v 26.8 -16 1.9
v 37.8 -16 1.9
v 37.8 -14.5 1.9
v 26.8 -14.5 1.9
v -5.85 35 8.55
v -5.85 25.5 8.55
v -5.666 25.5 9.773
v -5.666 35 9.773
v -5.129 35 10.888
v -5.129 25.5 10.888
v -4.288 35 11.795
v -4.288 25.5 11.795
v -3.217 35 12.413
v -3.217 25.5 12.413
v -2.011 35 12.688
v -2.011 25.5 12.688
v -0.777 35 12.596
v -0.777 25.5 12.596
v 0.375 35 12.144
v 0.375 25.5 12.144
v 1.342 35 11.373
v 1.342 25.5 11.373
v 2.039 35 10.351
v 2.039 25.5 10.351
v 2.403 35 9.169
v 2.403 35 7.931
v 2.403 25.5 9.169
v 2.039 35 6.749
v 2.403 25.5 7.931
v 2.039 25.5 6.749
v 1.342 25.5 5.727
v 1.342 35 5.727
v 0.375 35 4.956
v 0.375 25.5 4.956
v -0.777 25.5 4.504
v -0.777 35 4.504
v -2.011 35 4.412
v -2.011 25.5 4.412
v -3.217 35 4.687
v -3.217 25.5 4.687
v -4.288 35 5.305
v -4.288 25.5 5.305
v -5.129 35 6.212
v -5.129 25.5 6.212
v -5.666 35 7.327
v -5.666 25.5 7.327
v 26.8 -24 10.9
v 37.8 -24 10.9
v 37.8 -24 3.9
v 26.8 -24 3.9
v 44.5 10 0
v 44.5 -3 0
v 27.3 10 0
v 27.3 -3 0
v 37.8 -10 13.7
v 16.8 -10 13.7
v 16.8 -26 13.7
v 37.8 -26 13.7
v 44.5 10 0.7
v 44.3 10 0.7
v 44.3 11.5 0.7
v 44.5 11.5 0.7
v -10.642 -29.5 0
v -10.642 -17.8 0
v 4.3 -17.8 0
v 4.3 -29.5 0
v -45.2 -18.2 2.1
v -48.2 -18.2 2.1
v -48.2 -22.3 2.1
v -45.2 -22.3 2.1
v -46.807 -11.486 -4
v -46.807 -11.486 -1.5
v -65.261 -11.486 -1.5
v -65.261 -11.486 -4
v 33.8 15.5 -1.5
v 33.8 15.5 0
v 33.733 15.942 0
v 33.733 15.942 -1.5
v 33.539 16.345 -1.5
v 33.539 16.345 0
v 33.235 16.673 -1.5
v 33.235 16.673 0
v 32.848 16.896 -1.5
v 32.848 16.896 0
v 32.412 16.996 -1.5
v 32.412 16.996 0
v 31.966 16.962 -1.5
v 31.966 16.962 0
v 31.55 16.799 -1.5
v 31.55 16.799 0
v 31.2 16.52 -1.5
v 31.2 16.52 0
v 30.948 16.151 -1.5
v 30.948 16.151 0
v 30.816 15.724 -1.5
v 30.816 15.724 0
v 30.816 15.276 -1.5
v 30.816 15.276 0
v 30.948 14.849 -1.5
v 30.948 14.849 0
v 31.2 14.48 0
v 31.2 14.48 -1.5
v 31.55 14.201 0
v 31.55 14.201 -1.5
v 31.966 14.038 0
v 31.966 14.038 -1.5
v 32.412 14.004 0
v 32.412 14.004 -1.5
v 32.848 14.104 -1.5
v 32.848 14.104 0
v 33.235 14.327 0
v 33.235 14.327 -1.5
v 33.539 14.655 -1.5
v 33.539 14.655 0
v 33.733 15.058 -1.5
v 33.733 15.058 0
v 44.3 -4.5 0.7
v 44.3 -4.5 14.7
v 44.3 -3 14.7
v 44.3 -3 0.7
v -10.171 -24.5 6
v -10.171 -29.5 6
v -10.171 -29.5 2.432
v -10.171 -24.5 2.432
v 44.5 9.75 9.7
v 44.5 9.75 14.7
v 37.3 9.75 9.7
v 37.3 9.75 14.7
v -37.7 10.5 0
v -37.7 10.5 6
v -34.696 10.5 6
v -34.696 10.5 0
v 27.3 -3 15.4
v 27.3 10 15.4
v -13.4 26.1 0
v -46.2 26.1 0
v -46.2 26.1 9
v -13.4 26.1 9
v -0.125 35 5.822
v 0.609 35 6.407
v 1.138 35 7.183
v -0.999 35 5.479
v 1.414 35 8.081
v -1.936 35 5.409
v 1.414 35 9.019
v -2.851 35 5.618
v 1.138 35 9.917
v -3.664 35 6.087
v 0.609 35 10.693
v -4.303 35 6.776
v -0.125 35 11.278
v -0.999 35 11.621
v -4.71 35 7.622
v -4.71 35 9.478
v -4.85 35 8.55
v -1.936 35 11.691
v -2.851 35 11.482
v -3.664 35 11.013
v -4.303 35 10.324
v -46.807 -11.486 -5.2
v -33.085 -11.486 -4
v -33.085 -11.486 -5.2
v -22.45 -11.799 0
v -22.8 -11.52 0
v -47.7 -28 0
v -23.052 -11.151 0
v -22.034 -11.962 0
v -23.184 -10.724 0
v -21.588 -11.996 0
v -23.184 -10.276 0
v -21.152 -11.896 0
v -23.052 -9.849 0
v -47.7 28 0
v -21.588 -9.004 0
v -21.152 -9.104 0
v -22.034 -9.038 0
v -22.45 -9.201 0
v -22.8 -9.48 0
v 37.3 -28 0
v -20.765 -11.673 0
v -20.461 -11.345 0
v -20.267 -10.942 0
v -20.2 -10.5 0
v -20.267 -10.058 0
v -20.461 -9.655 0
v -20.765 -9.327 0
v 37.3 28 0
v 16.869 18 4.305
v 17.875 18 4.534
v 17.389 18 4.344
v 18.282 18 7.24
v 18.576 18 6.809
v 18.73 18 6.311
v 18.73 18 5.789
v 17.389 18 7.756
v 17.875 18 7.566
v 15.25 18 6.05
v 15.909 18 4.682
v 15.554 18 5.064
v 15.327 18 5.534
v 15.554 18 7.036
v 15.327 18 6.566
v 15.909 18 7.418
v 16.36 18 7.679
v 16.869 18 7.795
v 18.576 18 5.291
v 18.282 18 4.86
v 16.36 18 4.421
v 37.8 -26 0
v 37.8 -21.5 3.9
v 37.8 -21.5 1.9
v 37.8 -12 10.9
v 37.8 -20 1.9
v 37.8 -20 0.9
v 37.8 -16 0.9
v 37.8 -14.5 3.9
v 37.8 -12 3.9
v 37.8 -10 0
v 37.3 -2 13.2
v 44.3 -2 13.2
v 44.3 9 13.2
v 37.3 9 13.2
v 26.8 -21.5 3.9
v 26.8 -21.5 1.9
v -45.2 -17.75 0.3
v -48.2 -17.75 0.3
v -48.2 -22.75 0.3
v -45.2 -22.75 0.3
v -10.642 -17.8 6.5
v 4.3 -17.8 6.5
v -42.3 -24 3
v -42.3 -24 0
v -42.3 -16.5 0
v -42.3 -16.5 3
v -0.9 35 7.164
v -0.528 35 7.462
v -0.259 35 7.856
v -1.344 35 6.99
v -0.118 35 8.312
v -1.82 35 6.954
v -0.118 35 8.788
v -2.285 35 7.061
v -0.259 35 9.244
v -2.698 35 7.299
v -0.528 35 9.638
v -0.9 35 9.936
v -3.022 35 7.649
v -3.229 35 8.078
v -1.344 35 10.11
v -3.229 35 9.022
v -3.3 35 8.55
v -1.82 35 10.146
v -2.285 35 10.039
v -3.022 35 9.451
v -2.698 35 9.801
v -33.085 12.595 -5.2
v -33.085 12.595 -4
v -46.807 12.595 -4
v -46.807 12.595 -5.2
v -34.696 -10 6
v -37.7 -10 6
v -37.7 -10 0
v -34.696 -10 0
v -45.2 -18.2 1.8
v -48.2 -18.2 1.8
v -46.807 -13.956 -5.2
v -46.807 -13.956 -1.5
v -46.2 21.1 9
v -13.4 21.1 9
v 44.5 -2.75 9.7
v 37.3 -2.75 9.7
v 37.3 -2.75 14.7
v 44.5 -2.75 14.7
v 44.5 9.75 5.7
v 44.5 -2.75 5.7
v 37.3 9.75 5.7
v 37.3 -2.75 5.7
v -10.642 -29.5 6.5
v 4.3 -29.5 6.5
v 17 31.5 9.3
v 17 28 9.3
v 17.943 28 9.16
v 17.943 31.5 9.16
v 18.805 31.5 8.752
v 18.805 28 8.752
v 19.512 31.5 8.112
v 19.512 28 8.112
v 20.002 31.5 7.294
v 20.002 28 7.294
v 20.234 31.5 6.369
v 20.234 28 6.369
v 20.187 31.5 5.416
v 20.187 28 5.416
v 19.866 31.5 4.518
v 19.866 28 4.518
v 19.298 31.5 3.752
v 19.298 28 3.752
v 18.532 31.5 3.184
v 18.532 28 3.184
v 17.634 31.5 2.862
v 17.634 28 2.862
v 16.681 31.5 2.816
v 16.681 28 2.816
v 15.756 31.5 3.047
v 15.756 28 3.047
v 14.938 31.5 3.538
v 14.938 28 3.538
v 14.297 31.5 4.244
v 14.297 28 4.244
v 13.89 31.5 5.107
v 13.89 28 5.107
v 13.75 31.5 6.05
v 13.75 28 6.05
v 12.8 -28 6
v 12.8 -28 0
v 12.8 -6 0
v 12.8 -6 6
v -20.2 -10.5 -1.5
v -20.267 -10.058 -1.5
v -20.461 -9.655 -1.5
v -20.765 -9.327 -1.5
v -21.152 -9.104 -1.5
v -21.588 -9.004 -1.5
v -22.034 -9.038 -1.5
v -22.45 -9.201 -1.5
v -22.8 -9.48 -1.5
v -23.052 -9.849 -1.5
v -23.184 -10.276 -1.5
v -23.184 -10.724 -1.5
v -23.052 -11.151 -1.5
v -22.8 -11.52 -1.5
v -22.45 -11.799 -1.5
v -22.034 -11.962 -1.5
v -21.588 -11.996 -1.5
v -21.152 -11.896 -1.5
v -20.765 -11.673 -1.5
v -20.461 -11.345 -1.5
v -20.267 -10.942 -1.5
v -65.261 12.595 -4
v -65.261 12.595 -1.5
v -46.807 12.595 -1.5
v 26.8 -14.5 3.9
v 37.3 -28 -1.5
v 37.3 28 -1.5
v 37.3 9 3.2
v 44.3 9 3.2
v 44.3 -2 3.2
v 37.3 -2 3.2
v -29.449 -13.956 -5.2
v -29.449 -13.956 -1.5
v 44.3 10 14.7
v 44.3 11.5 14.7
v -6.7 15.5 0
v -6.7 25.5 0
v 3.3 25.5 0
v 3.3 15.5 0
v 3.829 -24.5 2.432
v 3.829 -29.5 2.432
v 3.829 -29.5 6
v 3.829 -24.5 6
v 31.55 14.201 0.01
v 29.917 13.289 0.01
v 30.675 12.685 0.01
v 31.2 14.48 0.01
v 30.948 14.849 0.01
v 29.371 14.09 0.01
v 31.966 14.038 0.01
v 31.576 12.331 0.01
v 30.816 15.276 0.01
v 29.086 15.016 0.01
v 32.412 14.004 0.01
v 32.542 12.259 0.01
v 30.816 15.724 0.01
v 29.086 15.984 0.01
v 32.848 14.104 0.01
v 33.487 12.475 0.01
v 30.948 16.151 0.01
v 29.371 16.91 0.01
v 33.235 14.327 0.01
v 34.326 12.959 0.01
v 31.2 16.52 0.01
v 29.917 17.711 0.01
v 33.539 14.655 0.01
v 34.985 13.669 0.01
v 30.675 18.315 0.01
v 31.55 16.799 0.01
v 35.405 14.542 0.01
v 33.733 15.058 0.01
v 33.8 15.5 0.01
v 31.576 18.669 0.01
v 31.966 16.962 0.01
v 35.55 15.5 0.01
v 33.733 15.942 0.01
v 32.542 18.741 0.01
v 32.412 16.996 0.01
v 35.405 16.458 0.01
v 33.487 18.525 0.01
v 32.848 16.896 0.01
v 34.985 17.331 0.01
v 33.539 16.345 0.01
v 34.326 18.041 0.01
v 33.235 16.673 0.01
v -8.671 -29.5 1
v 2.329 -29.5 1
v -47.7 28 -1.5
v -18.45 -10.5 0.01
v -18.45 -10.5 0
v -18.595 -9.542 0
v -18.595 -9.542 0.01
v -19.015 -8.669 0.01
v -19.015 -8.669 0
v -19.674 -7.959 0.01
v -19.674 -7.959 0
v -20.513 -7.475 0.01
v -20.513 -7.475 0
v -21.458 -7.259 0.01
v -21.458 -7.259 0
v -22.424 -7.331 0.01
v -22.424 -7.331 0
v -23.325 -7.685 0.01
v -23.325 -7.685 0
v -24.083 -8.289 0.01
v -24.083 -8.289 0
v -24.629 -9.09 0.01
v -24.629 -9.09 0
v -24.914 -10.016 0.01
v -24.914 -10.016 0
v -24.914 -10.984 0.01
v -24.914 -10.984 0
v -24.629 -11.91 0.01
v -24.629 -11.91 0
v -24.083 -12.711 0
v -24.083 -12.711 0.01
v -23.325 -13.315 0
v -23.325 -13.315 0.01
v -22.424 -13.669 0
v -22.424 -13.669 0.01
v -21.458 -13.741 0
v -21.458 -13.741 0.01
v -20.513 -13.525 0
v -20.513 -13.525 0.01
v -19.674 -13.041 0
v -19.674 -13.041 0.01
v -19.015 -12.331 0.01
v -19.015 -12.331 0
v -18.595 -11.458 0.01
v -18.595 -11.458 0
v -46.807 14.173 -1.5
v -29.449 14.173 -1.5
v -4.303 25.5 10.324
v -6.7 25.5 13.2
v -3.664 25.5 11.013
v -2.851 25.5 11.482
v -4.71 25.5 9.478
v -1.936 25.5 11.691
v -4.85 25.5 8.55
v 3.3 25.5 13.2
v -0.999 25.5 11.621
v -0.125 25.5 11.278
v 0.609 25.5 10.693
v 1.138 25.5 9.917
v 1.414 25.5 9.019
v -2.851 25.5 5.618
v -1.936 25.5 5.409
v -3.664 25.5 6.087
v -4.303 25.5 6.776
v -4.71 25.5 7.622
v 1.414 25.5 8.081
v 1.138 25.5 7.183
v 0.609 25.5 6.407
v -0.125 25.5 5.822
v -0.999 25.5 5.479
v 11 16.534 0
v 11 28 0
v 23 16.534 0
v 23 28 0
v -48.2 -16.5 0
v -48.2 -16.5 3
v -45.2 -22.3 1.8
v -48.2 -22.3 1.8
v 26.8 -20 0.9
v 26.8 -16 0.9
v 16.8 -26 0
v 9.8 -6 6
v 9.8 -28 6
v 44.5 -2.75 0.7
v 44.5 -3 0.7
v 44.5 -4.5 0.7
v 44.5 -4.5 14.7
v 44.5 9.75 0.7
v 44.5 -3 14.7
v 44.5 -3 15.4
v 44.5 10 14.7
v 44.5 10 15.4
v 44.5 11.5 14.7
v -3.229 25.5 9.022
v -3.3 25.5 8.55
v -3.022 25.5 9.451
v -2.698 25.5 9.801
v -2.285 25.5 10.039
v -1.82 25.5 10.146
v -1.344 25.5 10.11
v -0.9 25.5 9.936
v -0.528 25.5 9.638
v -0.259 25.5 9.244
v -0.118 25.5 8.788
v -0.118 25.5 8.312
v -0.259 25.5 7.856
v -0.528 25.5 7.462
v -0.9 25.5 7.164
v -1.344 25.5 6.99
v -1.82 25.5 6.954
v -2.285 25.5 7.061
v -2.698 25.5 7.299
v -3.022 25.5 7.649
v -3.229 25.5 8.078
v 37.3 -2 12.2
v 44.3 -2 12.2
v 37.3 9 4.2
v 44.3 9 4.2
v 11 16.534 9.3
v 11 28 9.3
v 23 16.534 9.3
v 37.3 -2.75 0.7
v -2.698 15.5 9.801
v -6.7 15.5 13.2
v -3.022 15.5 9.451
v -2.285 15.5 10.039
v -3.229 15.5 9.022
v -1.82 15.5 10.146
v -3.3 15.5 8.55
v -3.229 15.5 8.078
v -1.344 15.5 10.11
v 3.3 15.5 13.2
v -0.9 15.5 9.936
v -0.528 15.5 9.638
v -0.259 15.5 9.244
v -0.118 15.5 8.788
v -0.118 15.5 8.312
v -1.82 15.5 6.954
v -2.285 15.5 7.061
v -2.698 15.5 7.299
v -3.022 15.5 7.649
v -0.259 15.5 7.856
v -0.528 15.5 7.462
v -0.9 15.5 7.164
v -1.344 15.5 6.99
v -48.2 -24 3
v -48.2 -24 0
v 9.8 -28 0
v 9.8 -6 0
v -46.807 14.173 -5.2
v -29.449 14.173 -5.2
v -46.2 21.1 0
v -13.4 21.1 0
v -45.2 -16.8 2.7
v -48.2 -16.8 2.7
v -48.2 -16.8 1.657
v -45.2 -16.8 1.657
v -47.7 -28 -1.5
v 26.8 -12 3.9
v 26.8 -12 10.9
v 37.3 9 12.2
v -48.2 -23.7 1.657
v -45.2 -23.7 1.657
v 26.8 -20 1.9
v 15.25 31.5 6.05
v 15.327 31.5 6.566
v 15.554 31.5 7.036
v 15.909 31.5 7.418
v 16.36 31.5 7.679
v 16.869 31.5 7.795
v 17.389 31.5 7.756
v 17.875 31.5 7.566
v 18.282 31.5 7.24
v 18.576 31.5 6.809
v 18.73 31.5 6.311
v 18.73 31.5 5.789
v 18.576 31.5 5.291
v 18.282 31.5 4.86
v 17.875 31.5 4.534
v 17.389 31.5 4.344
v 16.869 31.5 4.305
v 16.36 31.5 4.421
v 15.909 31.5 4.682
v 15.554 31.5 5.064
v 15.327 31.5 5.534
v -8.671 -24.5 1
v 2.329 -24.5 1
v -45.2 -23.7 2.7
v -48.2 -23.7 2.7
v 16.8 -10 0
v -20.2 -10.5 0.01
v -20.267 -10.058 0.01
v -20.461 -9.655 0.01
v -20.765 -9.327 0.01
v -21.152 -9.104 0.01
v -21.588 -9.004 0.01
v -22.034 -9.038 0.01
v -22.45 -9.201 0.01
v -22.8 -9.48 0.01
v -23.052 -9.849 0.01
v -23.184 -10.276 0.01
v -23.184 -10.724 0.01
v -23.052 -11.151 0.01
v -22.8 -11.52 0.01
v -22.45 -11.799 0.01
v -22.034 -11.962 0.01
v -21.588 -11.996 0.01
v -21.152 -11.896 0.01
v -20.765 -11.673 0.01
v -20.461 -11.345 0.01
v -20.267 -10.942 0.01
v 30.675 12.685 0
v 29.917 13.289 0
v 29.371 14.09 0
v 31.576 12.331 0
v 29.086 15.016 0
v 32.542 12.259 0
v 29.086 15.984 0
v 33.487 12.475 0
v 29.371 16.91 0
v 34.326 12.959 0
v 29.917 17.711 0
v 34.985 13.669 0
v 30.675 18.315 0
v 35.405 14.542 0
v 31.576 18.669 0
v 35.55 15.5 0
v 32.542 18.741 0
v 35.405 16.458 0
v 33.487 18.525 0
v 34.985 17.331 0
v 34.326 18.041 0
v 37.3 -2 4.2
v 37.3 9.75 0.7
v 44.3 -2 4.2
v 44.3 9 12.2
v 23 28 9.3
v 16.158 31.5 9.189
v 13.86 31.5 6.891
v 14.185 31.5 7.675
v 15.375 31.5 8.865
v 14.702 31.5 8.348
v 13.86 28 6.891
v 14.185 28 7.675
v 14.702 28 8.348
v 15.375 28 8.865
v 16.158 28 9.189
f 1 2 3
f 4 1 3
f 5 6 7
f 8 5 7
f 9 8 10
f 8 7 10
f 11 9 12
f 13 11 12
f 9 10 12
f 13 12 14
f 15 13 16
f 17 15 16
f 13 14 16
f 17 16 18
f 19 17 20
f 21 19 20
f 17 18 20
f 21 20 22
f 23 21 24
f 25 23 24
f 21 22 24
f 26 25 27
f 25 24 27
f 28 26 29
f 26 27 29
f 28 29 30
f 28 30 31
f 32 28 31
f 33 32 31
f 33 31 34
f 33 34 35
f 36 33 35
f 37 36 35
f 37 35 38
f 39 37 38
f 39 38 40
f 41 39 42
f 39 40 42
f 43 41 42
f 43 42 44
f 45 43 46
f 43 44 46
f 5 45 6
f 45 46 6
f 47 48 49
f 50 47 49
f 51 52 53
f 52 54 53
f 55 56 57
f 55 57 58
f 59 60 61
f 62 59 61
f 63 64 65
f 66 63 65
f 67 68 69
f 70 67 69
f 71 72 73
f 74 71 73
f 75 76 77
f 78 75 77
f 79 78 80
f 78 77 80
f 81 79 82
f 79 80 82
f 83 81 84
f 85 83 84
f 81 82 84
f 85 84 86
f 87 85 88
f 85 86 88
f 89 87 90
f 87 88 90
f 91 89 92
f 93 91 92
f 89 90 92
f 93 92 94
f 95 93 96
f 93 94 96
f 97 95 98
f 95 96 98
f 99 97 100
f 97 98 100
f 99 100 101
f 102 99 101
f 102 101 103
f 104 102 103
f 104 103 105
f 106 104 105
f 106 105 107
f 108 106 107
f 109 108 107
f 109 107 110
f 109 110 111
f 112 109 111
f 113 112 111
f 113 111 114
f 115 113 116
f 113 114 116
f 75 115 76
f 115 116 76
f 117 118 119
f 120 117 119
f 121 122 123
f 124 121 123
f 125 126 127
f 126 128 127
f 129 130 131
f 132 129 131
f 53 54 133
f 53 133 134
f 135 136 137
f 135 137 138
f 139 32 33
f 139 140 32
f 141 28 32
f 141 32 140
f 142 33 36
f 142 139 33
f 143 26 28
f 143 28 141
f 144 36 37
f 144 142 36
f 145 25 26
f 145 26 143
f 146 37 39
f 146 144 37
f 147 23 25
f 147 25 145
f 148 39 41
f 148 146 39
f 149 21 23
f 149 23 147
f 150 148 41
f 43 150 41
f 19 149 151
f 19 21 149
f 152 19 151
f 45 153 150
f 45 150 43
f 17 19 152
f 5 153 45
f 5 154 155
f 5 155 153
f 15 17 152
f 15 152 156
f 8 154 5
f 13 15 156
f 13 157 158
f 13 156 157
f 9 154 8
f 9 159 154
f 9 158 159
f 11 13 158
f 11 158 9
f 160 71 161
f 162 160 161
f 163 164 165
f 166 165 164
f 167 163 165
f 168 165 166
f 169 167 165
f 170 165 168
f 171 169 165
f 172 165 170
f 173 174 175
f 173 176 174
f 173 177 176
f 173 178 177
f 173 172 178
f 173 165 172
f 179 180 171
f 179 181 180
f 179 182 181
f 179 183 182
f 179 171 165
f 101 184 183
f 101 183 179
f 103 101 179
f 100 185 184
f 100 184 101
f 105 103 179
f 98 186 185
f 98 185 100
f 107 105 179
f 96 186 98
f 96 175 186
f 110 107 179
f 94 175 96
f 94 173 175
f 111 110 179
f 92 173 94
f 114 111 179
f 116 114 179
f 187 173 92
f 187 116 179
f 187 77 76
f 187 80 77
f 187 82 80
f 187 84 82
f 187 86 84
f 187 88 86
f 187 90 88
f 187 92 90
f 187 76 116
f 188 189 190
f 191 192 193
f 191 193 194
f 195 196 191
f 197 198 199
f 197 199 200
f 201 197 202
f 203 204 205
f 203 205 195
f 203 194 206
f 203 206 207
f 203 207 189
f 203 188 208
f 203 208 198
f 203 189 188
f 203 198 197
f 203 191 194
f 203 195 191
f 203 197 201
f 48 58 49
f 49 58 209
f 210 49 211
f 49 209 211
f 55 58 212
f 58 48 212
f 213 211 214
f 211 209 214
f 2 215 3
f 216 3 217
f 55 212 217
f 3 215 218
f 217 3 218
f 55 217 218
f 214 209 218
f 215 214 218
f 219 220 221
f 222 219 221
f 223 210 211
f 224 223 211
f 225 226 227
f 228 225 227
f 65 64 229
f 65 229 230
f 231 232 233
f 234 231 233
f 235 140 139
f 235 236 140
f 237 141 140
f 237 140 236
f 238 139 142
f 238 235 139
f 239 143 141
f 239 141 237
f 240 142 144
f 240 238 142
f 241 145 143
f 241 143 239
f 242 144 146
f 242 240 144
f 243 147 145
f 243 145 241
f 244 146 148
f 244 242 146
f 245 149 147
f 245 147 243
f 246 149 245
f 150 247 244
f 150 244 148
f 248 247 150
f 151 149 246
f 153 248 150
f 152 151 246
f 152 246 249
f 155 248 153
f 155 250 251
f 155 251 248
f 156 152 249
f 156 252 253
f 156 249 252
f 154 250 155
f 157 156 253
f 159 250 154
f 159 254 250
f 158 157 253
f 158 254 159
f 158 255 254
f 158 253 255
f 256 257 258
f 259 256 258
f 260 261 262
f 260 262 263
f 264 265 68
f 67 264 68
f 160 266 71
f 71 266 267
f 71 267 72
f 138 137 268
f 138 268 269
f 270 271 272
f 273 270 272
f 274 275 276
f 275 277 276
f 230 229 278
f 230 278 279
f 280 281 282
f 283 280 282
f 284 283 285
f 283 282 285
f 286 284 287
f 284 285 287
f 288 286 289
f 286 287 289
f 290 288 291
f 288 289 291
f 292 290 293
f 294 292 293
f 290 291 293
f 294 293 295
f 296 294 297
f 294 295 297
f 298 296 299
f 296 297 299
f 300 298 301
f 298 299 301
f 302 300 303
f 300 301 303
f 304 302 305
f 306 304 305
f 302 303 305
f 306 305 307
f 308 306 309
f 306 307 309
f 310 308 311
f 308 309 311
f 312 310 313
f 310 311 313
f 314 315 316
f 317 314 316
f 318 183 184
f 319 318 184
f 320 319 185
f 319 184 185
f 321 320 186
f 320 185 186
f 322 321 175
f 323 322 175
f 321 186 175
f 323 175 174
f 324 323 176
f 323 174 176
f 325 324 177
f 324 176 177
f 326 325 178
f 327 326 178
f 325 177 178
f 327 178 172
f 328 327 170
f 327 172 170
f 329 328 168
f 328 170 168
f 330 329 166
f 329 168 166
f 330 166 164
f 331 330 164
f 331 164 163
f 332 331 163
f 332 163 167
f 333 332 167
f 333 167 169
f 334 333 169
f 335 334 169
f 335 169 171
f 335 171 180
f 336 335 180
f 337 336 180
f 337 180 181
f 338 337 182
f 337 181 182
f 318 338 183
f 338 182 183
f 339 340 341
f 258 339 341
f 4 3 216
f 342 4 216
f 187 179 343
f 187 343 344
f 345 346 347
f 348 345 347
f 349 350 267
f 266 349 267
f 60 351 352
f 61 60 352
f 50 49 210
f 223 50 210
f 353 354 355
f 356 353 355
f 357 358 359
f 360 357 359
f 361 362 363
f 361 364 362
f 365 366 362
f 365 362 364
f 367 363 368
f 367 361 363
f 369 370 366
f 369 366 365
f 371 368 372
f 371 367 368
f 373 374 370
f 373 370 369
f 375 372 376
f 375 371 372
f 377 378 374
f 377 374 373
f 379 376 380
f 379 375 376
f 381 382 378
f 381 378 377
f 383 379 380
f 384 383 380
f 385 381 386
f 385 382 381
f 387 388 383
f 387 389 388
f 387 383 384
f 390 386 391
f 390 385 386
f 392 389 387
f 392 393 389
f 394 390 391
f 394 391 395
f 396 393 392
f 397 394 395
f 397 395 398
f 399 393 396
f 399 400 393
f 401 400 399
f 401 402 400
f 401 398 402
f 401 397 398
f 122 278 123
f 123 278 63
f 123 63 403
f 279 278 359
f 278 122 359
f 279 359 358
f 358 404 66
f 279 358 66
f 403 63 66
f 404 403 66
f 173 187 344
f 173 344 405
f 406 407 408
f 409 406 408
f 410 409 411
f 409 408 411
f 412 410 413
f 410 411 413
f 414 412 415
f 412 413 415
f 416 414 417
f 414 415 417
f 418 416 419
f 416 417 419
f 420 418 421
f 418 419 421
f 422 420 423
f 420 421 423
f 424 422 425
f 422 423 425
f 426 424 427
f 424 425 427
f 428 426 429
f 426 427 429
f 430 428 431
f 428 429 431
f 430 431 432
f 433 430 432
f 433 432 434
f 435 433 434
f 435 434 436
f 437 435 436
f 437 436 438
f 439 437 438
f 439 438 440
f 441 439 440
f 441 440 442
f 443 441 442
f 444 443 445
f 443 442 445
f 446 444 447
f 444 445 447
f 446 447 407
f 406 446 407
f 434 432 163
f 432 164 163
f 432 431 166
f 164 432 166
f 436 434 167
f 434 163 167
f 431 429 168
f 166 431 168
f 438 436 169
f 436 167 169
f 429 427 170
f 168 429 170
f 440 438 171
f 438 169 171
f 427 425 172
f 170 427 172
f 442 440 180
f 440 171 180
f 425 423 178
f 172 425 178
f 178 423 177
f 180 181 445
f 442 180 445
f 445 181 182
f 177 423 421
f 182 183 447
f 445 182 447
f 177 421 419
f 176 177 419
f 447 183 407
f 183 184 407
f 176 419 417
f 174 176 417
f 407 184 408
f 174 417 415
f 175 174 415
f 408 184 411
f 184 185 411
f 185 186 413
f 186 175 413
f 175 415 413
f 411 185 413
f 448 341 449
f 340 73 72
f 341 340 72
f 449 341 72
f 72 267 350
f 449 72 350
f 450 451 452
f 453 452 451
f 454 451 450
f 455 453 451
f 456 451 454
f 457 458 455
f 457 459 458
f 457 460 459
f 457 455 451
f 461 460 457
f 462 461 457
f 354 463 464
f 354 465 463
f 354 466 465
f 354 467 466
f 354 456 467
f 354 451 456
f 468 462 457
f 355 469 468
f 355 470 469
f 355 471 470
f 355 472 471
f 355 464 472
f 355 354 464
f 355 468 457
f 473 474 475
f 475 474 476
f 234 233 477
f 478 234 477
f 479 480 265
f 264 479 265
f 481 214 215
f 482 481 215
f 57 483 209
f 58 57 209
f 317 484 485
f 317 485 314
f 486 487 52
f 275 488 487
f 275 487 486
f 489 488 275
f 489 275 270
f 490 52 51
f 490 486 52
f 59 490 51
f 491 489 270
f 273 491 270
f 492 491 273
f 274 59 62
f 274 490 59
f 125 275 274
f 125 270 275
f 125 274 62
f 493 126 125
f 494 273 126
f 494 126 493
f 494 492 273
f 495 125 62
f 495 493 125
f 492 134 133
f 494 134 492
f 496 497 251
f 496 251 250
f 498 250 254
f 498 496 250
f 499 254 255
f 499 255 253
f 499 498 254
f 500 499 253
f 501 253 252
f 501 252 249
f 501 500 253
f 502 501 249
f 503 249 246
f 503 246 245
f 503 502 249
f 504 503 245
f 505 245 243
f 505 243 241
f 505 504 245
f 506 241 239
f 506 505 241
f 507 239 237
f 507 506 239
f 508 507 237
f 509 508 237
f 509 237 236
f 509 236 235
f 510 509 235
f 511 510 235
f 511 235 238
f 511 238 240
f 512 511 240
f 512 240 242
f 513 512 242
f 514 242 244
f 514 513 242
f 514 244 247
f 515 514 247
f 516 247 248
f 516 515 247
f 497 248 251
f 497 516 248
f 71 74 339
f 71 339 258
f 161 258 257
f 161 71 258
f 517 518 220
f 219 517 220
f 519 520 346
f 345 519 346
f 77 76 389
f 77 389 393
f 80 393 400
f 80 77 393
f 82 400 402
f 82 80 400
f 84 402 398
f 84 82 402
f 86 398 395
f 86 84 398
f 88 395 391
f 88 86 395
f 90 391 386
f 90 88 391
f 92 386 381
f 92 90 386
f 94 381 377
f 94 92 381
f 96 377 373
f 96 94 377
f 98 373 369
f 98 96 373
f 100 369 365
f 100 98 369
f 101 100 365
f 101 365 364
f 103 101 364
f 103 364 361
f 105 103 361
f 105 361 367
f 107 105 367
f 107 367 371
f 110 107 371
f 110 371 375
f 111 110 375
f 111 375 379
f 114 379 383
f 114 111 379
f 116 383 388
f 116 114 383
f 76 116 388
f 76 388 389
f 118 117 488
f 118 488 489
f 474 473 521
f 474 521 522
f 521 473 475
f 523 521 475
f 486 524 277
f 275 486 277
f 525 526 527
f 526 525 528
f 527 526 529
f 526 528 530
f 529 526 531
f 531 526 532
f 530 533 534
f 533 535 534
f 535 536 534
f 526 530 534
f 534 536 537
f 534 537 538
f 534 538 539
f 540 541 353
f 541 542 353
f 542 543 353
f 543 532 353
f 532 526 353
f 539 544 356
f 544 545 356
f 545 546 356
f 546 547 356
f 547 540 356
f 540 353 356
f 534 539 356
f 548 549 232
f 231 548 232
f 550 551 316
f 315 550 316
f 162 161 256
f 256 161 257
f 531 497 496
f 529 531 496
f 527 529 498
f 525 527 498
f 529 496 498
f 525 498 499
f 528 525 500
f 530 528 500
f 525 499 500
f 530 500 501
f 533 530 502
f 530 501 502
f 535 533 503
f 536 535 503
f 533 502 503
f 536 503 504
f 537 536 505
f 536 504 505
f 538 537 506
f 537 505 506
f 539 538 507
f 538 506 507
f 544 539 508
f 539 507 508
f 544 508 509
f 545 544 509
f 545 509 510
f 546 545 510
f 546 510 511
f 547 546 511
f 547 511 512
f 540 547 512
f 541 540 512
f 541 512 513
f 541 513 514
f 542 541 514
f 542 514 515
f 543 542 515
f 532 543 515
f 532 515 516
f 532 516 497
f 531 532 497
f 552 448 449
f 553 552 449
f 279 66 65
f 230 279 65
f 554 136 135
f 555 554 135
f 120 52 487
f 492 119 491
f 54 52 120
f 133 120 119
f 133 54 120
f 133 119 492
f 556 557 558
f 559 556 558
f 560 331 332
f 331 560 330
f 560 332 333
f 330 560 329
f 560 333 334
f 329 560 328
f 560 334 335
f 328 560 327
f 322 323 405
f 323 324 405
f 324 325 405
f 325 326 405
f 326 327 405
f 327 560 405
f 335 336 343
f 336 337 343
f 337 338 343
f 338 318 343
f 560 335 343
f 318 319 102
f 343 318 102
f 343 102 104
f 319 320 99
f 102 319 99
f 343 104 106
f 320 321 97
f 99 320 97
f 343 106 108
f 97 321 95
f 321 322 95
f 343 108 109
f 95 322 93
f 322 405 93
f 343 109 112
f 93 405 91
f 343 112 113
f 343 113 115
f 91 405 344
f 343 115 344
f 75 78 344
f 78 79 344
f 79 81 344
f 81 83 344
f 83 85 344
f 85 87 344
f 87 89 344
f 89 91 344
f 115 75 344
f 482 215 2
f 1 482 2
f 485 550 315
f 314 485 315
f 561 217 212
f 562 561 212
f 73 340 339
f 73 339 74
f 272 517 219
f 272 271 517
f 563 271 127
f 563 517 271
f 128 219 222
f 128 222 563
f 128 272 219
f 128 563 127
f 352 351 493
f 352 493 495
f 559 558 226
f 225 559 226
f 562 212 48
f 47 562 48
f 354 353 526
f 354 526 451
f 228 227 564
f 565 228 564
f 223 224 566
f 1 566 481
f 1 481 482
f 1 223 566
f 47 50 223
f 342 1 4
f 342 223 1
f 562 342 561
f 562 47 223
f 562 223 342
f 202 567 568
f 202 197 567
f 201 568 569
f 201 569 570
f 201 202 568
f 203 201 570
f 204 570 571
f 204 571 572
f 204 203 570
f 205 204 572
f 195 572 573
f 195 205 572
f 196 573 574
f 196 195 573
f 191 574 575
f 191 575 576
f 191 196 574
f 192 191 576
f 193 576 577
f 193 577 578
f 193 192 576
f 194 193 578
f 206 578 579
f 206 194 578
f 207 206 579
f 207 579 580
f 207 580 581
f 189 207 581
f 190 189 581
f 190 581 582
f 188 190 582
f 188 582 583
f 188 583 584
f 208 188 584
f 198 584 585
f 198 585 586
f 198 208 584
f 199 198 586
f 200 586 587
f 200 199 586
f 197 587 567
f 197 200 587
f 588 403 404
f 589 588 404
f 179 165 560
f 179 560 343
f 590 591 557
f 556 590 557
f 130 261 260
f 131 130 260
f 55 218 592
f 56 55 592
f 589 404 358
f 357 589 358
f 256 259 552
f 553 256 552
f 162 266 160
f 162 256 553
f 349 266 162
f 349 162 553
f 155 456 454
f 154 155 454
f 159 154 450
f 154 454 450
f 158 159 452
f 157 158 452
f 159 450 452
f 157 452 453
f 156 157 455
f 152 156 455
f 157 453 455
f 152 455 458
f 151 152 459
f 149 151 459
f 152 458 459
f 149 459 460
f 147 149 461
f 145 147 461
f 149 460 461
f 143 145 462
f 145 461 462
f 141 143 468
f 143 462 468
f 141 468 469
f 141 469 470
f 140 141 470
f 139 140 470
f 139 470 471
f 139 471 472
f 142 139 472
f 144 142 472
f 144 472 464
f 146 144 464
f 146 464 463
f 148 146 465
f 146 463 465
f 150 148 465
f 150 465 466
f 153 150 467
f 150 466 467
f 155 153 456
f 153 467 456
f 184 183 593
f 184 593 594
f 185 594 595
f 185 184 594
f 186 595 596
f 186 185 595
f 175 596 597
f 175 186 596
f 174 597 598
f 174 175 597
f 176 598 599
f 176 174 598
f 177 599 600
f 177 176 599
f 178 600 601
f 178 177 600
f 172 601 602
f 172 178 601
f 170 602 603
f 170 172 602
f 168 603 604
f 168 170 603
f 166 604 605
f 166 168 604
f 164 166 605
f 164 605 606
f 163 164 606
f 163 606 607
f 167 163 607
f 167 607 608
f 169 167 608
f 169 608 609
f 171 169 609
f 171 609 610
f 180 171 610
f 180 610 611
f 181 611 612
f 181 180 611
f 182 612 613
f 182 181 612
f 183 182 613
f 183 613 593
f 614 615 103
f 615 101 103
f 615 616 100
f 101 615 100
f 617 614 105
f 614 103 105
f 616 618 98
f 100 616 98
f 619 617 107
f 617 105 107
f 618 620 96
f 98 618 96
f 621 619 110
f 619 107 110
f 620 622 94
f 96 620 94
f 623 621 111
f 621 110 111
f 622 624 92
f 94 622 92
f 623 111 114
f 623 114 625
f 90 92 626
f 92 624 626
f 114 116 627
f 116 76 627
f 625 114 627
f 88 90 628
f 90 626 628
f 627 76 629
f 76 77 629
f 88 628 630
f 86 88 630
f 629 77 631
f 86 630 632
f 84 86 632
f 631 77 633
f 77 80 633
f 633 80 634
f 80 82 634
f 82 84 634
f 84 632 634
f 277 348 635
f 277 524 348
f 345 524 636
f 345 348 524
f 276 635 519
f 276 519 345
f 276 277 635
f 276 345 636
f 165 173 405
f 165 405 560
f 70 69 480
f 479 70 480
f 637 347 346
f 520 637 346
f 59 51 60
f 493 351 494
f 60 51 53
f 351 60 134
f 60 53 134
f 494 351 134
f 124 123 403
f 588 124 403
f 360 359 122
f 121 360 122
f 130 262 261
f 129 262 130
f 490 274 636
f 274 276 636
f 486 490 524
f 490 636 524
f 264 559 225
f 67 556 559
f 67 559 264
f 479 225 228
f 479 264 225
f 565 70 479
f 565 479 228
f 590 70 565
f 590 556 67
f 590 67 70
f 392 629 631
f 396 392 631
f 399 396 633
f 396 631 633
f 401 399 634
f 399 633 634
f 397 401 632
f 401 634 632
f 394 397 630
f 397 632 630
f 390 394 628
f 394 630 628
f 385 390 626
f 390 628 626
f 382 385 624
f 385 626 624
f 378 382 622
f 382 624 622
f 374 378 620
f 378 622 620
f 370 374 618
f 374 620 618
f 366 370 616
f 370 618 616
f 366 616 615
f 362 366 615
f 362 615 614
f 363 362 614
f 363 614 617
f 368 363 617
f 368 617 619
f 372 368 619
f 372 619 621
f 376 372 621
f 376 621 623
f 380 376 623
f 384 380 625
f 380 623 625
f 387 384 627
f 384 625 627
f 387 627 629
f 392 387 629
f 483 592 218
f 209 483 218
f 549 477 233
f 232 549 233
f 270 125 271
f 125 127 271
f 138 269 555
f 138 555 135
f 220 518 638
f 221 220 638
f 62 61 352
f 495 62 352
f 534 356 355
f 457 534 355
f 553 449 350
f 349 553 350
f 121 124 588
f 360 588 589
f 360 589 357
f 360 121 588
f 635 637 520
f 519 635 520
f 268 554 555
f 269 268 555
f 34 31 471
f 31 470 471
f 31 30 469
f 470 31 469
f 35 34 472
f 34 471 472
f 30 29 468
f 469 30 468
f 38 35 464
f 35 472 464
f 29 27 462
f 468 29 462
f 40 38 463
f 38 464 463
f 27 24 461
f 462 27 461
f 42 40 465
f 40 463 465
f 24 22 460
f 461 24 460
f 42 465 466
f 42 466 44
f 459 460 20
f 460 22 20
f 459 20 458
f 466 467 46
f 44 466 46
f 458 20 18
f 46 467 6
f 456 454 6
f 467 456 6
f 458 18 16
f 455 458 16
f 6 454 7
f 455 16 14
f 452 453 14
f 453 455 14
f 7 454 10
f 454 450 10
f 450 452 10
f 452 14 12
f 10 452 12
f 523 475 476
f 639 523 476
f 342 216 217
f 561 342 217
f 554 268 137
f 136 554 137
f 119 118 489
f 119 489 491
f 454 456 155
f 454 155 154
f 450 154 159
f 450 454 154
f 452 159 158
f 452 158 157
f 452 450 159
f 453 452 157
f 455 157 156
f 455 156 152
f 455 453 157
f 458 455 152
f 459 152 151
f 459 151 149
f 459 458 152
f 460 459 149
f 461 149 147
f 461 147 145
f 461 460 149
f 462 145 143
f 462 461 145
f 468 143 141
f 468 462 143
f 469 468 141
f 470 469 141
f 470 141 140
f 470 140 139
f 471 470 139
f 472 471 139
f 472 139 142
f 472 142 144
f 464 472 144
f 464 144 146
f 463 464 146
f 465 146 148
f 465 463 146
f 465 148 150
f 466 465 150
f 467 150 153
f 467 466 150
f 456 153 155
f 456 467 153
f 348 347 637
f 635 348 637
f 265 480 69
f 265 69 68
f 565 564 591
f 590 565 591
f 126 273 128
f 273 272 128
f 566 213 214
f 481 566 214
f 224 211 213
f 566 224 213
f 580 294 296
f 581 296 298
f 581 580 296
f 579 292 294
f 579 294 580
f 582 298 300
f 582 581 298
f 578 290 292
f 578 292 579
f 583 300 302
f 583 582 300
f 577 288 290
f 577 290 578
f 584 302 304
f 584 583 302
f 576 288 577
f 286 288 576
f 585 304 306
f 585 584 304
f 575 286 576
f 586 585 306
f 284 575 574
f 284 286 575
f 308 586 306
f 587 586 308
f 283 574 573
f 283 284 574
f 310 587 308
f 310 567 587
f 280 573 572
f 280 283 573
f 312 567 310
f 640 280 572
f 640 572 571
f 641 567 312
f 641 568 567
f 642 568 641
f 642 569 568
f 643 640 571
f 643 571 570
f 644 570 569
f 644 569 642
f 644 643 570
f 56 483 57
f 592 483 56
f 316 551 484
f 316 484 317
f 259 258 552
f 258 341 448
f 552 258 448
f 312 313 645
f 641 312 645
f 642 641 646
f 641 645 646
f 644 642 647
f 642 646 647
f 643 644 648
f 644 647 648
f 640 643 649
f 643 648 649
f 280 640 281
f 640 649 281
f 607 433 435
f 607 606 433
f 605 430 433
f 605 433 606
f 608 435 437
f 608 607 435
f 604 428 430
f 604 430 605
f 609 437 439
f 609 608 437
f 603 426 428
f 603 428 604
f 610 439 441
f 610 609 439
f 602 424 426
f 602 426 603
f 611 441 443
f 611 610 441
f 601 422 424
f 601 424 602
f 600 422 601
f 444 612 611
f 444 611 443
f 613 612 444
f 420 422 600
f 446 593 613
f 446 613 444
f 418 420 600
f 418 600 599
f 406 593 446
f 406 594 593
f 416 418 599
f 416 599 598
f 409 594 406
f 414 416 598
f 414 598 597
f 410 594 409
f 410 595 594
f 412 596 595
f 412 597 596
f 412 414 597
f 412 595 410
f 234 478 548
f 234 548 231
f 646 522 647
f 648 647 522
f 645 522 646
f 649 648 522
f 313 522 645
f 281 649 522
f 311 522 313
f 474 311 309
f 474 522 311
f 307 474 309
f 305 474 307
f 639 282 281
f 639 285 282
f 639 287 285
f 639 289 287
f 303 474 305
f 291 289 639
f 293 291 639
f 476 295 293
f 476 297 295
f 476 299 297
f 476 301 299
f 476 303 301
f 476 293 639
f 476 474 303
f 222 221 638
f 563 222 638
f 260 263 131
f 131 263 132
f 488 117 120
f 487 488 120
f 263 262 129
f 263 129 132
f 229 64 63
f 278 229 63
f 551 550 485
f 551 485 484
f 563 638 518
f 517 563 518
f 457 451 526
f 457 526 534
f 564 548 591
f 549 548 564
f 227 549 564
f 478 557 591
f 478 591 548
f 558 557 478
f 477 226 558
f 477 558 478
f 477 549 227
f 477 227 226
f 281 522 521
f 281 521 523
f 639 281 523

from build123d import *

# Parameters (mm, degrees)
F0_R      = 3.25
F0_W      = 32.8
F0_H      = 5
F0_W_2    = 10
F0_H_2    = 10
F0_H_3    = 13
F0_R_2    = 1.5
F0_W_3    = 20.5
F0_H_4    = 16
F0_W_4    = 13.5
F0_H_5    = 24
F0_W_5    = 3.0046645552
F0_H_6    = 20.5
F0_W_6    = 1
F0_W_7    = 5.4
F0_H_7    = 7.5
F0_W_8    = 12
F0_H_8    = 11.4661744535
F0_W_9    = 14.9416802451
F0_H_9    = 10.2
F0_W_10   = 3
F0_H_10   = 22
F1_DEPTH  = 1.5
F0_W_11   = 0.5
F2_DEPTH  = 13.7
F0_W_12   = 7
F3_DEPTH  = 15.4
F4_DEPTH  = 9.3
F5_DEPTH  = 13.2
F6_DEPTH  = 9
F7_DEPTH  = 6
F0_H_11   = 1.5
F8_DEPTH  = 6.5
F9_DEPTH  = 0.01
F10_DEPTH = 3
F11_DEPTH = 6
F13_DEPTH = 3.7
F12_W     = 13.7211494148
F12_H     = 24.080616422
F12_W_2   = 0.8938605189
F12_W_3   = 17.5610897839
F14_DEPTH = 2.5
F15_R     = 1.75
F16_DEPTH = 3.5
F17_DEPTH = 10
F18_R     = 1.6
F19_DEPTH = 55.001
F18_R_2   = 3.15
F20_DEPTH = 9.5
F18_R_3   = 4.15
F21_DEPTH = 9.5
F23_DEPTH = 5
F25_DEPTH = 11
F27_DEPTH = 7
F29_DEPTH = 3
F30_W     = 1.5
F30_H     = 14
F26_W     = 13
F26_H     = 15.4
F31_DEPTH = 0.2


with BuildPart() as f1:
    # F0 (on Top) → F1 (new body)
    with BuildSketch(Plane.XY):
        Polygon((10.999614042, 28), (-47.700385958, 28), (-47.700385958, 12.6100301519), (-46.700385958, 12.6100301519), (-46.700385958, 14.1100301519), (-29.700385958, 14.1100301519), (-29.700385958, -13.8899698481), (-46.700385958, -13.8899698481), (-46.700385958, -11.3899698481), (-47.700385958, -11.3899698481), (-47.700385958, -16.5), (-42.300385958, -16.5), (-42.300385958, -24), (-47.700385958, -24), (-47.700385958, -28), (-10.6420662031, -28), (-10.6420662031, -17.8), (4.299614042, -17.8), (4.299614042, -28), (9.799614042, -28), (9.799614042, -6), (12.799614042, -6), (12.799614042, -28), (37.299614042, -28), (37.299614042, -26), (16.799614042, -26), (16.799614042, -10), (37.299614042, -10), (37.299614042, -3), (27.299614042, -3), (27.299614042, 10), (37.299614042, 10), (37.299614042, 28), (22.999614042, 28), (22.999614042, 16.5338255465), (10.999614042, 16.5338255465), align=None)
        with Locations((-21.700385958, -10.5)):
            Circle(F0_R, mode=Mode.SUBTRACT)
        with Locations((-29.800385958, 23.6)):
            Rectangle(F0_W, F0_H, mode=Mode.SUBTRACT)
        with Locations((-1.700385958, 20.5)):
            Rectangle(F0_W_2, F0_H_2, mode=Mode.SUBTRACT)
        with Locations((32.299614042, 15.5)):
            Circle(F0_R, mode=Mode.SUBTRACT)
        with Locations((32.299614042, 3.5)):
            Rectangle(F0_W_2, F0_H_3)
        with Locations((32.299614042, 15.5)):
            Circle(F0_R)
        with Locations((32.299614042, 15.5)):
            Circle(F0_R_2, mode=Mode.SUBTRACT)
        with Locations((-21.700385958, -10.5)):
            Circle(F0_R)
        with Locations((-21.700385958, -10.5)):
            Circle(F0_R_2, mode=Mode.SUBTRACT)
        with Locations((27.049614042, -18)):
            Rectangle(F0_W_3, F0_H_4)
        Polygon((-46.700385958, 14.1100301519), (-46.700385958, 12.6100301519), (-33.200385958, 12.6100301519), (-33.200385958, -11.3899698481), (-46.700385958, -11.3899698481), (-46.700385958, -13.8899698481), (-29.700385958, -13.8899698481), (-29.700385958, 14.1100301519), align=None)
        with Locations((-39.950385958, 0.6100301519)):
            Rectangle(F0_W_4, F0_H_5)
        with Locations((-36.1980536804, 0.25)):
            Rectangle(F0_W_5, F0_H_6, mode=Mode.SUBTRACT)
        with Locations((-47.200385958, 0.6100301519)):
            Rectangle(F0_W_6, F0_H_5)
        with Locations((-45.000385958, -20.25)):
            Rectangle(F0_W_7, F0_H_7)
        with Locations((-29.800385958, 23.6)):
            Rectangle(F0_W, F0_H)
        with Locations((-1.700385958, 20.5)):
            Rectangle(F0_W_2, F0_H_2)
        with Locations((16.999614042, 22.2669127733)):
            Rectangle(F0_W_8, F0_H_8)
        with Locations((-3.1712260805, -22.9)):
            Rectangle(F0_W_9, F0_H_9)
        with Locations((11.299614042, -17)):
            Rectangle(F0_W_10, F0_H_10)
        with Locations((-36.1980536804, 0.25)):
            Rectangle(F0_W_5, F0_H_6)
    extrude(amount=-F1_DEPTH)


with BuildPart() as f2:
    # F0 (on Top) → F2 (new body)
    with BuildSketch(Plane.XY):
        with Locations((27.049614042, -18)):
            Rectangle(F0_W_3, F0_H_4)
        with Locations((37.549614042, -18)):
            Rectangle(F0_W_11, F0_H_4)
    extrude(amount=F2_DEPTH)

    # F24 (on face) → F25 (cut)
    with BuildSketch(Plane.YZ.offset(37.799614042)):
        Polygon((-12, 10.9), (-18, 10.9), (-24, 10.9), (-24, 3.9), (-21.5, 3.9), (-21.5, 1.9), (-20, 1.9), (-20, 0.9), (-18, 0.9), (-16, 0.9), (-16, 1.9), (-14.5, 1.9), (-14.5, 3.9), (-12, 3.9), align=None)
    extrude(amount=-F25_DEPTH, mode=Mode.SUBTRACT)


with BuildPart() as f3:
    # F0 (on Top) → F3 (new body)
    with BuildSketch(Plane.XY):
        with Locations((32.299614042, 3.5)):
            Rectangle(F0_W_2, F0_H_3)
        with Locations((40.799614042, 3.5)):
            Rectangle(F0_W_12, F0_H_3)
    extrude(amount=F3_DEPTH)

    # F26 (on face) → F27 (cut)
    with BuildSketch(Plane.YZ.offset(44.299614042)):
        Polygon((9.75, 14.7), (3.5, 14.7), (-2.75, 14.7), (-2.75, 9.7), (3.5, 9.7), (9.75, 9.7), align=None)
        Polygon((-2, 13.2), (3.5, 13.2), (9, 13.2), (9, 12.2), (3.5, 12.2), (-2, 12.2), align=None, mode=Mode.SUBTRACT)
        Polygon((9.75, 5.7), (3.5, 5.7), (-2.75, 5.7), (-2.75, 0.7), (3.5, 0.7), (9.75, 0.7), align=None)
        Polygon((-2, 4.2), (3.5, 4.2), (9, 4.2), (9, 3.2), (3.5, 3.2), (-2, 3.2), align=None, mode=Mode.SUBTRACT)
    extrude(amount=-F27_DEPTH, mode=Mode.SUBTRACT)

    # F30 (on face) + F26 (on face) → F31 (join)
    with BuildSketch(Plane.YZ.offset(44.299614042)):
        with Locations((-3.75, 7.7)):
            Rectangle(F30_W, F30_H)
        with Locations((10.75, 7.7)):
            Rectangle(F30_W, F30_H)
    with BuildSketch(Plane.YZ.offset(44.299614042)):
        with Locations((3.5, 7.7)):
            Rectangle(F26_W, F26_H)
        Polygon((-2.75, 5.7), (3.5, 5.7), (9.75, 5.7), (9.75, 0.7), (3.5, 0.7), (-2.75, 0.7), align=None, mode=Mode.SUBTRACT)
        Polygon((-2.75, 14.7), (3.5, 14.7), (9.75, 14.7), (9.75, 9.7), (3.5, 9.7), (-2.75, 9.7), align=None, mode=Mode.SUBTRACT)
    extrude(amount=F31_DEPTH)


with BuildPart() as f4:
    # F0 (on Top) → F4 (new body)
    with BuildSketch(Plane.XY):
        with Locations((16.999614042, 22.2669127733)):
            Rectangle(F0_W_8, F0_H_8)
    extrude(amount=F4_DEPTH)

    # F15 (on face) → F16 (join)
    with BuildSketch(Plane(origin=(0, 28, 0), x_dir=(-1, 0, 0), z_dir=(0, 1, 0))):
        with BuildLine():
            ThreePointArc((-16.999614042, 9.3), (-19.2977110809, 3.7519029611), (-13.749614042, 6.05))
            ThreePointArc((-13.749614042, 6.05), (-14.7015170032, 8.3480970389), (-16.999614042, 9.3))
        make_face()
        with Locations((-16.999614042, 6.05)):
            Circle(F15_R, mode=Mode.SUBTRACT)
    extrude(amount=F16_DEPTH)

    # F15 (on face) → F17 (cut)
    with BuildSketch(Plane(origin=(0, 28, 0), x_dir=(-1, 0, 0), z_dir=(0, 1, 0))):
        with Locations((-16.999614042, 6.05)):
            Circle(F15_R)
    extrude(amount=-F17_DEPTH, mode=Mode.SUBTRACT)


with BuildPart() as f5:
    # F0 (on Top) → F5 (new body)
    with BuildSketch(Plane.XY):
        with Locations((-1.700385958, 20.5)):
            Rectangle(F0_W_2, F0_H_2)
    extrude(amount=F5_DEPTH)

    # F18 (on face) → F19 (cut, through all)
    with BuildSketch(Plane(origin=(0, 25.5, 0), x_dir=(-1, 0, 0), z_dir=(0, 1, 0))):
        with Locations((1.700385958, 8.55)):
            Circle(F18_R)
    extrude(amount=-F19_DEPTH, mode=Mode.SUBTRACT)

    # F18 (on face) → F20 (join)
    with BuildSketch(Plane(origin=(0, 25.5, 0), x_dir=(-1, 0, 0), z_dir=(0, 1, 0))):
        with Locations((1.700385958, 8.55)):
            Circle(F18_R_2)
        with Locations((1.700385958, 8.55)):
            Circle(F18_R, mode=Mode.SUBTRACT)
    extrude(amount=F20_DEPTH)


with BuildPart() as f6:
    # F0 (on Top) → F6 (new body)
    with BuildSketch(Plane.XY):
        with Locations((-29.800385958, 23.6)):
            Rectangle(F0_W, F0_H)
    extrude(amount=F6_DEPTH)


with BuildPart() as f7:
    # F0 (on Top) → F7 (new body)
    with BuildSketch(Plane.XY):
        with Locations((11.299614042, -17)):
            Rectangle(F0_W_10, F0_H_10)
    extrude(amount=F7_DEPTH)


with BuildPart() as f8:
    # F0 (on Top) → F8 (new body)
    with BuildSketch(Plane.XY):
        with Locations((-3.1712260805, -22.9)):
            Rectangle(F0_W_9, F0_H_9)
        with Locations((-3.1712260805, -28.75)):
            Rectangle(F0_W_9, F0_H_11)
    extrude(amount=F8_DEPTH)

    # F22 (on face) → F23 (cut)
    with BuildSketch(Plane.XZ.offset(29.5)):
        Polygon((3.8287739195, 2.4324118094), (3.8287739195, 6), (-3.1712260805, 6), (-10.1712260805, 6), (-10.1712260805, 2.4324118094), (-8.6712260805, 1), (-3.1712260805, 1), (2.3287739195, 1), align=None)
    extrude(amount=-F23_DEPTH, mode=Mode.SUBTRACT)


with BuildPart() as f9:
    # F0 (on Top) → F9 (new body)
    with BuildSketch(Plane.XY):
        with Locations((32.299614042, 15.5)):
            Circle(F0_R)
        with Locations((32.299614042, 15.5)):
            Circle(F0_R_2, mode=Mode.SUBTRACT)
    extrude(amount=F9_DEPTH)


with BuildPart() as f9b:
    # F0 (on Top) → F9, piece 2 (new body)
    with BuildSketch(Plane.XY):
        with Locations((-21.700385958, -10.5)):
            Circle(F0_R)
        with Locations((-21.700385958, -10.5)):
            Circle(F0_R_2, mode=Mode.SUBTRACT)
    extrude(amount=F9_DEPTH)


with BuildPart() as f10:
    # F0 (on Top) → F10 (new body)
    with BuildSketch(Plane.XY):
        with Locations((-45.000385958, -20.25)):
            Rectangle(F0_W_7, F0_H_7)
        with Locations((-47.950385958, -20.25)):
            Rectangle(F0_W_11, F0_H_7)
    extrude(amount=F10_DEPTH)

    # F28 (on face) → F29 (cut)
    with BuildSketch(Plane(origin=(-48.200385958, 0, 0), x_dir=(0, -1, 0), z_dir=(-1, 0, 0))):
        Polygon((23.7, 2.7), (20.25, 2.7), (16.8, 2.7), (16.8, 1.6567406064), (17.75, 0.3), (20.25, 0.3), (22.75, 0.3), (23.7, 1.6567406064), align=None)
        Polygon((18.2, 2.1), (20.25, 2.1), (22.3, 2.1), (22.3, 1.8), (20.25, 1.8), (18.2, 1.8), align=None, mode=Mode.SUBTRACT)
    extrude(amount=-F29_DEPTH, mode=Mode.SUBTRACT)


with BuildPart() as f11:
    # F0 (on Top) → F11 (new body)
    with BuildSketch(Plane.XY):
        with Locations((-36.1980536804, 0.25)):
            Rectangle(F0_W_5, F0_H_6)
    extrude(amount=F11_DEPTH)


with BuildPart() as f13:
    # F12 (on face) → F13 (new body)
    with BuildSketch(Plane(origin=(0, 0, -1.5), x_dir=(1, 0, 0), z_dir=(0, 0, -1))):
        Polygon((-46.806525439, 13.9555186033), (-46.806525439, 11.4857107401), (-33.0853760242, 11.4857107401), (-33.0853760242, -12.5949056819), (-46.806525439, -12.5949056819), (-46.806525439, -14.1728390008), (-29.4492729008, -14.1728390008), (-29.4492729008, 13.9555186033), align=None)
    extrude(amount=F13_DEPTH)

    # F12 (on face) → F14 (join)
    with BuildSketch(Plane(origin=(0, 0, -1.5), x_dir=(1, 0, 0), z_dir=(0, 0, -1))):
        with Locations((-39.9459507316, -0.5545974709)):
            Rectangle(F12_W, F12_H)
        with Locations((-47.2534556985, -0.5545974709)):
            Rectangle(F12_W_2, F12_H)
        with Locations((-56.4809308499, -0.5545974709)):
            Rectangle(F12_W_3, F12_H)
    extrude(amount=F14_DEPTH)


with BuildPart() as f21:
    # F18 (on face) → F21 (new body)
    with BuildSketch(Plane(origin=(0, 25.5, 0), x_dir=(-1, 0, 0), z_dir=(0, 1, 0))):
        with Locations((1.700385958, 8.55)):
            Circle(F18_R_3)
        with Locations((1.700385958, 8.55)):
            Circle(F18_R_2, mode=Mode.SUBTRACT)
    extrude(amount=F21_DEPTH)


solid = Compound([f1.part, f2.part, f3.part, f4.part, f5.part, f6.part, f7.part, f8.part, f9.part, f9b.part, f10.part, f11.part, f13.part, f21.part])
